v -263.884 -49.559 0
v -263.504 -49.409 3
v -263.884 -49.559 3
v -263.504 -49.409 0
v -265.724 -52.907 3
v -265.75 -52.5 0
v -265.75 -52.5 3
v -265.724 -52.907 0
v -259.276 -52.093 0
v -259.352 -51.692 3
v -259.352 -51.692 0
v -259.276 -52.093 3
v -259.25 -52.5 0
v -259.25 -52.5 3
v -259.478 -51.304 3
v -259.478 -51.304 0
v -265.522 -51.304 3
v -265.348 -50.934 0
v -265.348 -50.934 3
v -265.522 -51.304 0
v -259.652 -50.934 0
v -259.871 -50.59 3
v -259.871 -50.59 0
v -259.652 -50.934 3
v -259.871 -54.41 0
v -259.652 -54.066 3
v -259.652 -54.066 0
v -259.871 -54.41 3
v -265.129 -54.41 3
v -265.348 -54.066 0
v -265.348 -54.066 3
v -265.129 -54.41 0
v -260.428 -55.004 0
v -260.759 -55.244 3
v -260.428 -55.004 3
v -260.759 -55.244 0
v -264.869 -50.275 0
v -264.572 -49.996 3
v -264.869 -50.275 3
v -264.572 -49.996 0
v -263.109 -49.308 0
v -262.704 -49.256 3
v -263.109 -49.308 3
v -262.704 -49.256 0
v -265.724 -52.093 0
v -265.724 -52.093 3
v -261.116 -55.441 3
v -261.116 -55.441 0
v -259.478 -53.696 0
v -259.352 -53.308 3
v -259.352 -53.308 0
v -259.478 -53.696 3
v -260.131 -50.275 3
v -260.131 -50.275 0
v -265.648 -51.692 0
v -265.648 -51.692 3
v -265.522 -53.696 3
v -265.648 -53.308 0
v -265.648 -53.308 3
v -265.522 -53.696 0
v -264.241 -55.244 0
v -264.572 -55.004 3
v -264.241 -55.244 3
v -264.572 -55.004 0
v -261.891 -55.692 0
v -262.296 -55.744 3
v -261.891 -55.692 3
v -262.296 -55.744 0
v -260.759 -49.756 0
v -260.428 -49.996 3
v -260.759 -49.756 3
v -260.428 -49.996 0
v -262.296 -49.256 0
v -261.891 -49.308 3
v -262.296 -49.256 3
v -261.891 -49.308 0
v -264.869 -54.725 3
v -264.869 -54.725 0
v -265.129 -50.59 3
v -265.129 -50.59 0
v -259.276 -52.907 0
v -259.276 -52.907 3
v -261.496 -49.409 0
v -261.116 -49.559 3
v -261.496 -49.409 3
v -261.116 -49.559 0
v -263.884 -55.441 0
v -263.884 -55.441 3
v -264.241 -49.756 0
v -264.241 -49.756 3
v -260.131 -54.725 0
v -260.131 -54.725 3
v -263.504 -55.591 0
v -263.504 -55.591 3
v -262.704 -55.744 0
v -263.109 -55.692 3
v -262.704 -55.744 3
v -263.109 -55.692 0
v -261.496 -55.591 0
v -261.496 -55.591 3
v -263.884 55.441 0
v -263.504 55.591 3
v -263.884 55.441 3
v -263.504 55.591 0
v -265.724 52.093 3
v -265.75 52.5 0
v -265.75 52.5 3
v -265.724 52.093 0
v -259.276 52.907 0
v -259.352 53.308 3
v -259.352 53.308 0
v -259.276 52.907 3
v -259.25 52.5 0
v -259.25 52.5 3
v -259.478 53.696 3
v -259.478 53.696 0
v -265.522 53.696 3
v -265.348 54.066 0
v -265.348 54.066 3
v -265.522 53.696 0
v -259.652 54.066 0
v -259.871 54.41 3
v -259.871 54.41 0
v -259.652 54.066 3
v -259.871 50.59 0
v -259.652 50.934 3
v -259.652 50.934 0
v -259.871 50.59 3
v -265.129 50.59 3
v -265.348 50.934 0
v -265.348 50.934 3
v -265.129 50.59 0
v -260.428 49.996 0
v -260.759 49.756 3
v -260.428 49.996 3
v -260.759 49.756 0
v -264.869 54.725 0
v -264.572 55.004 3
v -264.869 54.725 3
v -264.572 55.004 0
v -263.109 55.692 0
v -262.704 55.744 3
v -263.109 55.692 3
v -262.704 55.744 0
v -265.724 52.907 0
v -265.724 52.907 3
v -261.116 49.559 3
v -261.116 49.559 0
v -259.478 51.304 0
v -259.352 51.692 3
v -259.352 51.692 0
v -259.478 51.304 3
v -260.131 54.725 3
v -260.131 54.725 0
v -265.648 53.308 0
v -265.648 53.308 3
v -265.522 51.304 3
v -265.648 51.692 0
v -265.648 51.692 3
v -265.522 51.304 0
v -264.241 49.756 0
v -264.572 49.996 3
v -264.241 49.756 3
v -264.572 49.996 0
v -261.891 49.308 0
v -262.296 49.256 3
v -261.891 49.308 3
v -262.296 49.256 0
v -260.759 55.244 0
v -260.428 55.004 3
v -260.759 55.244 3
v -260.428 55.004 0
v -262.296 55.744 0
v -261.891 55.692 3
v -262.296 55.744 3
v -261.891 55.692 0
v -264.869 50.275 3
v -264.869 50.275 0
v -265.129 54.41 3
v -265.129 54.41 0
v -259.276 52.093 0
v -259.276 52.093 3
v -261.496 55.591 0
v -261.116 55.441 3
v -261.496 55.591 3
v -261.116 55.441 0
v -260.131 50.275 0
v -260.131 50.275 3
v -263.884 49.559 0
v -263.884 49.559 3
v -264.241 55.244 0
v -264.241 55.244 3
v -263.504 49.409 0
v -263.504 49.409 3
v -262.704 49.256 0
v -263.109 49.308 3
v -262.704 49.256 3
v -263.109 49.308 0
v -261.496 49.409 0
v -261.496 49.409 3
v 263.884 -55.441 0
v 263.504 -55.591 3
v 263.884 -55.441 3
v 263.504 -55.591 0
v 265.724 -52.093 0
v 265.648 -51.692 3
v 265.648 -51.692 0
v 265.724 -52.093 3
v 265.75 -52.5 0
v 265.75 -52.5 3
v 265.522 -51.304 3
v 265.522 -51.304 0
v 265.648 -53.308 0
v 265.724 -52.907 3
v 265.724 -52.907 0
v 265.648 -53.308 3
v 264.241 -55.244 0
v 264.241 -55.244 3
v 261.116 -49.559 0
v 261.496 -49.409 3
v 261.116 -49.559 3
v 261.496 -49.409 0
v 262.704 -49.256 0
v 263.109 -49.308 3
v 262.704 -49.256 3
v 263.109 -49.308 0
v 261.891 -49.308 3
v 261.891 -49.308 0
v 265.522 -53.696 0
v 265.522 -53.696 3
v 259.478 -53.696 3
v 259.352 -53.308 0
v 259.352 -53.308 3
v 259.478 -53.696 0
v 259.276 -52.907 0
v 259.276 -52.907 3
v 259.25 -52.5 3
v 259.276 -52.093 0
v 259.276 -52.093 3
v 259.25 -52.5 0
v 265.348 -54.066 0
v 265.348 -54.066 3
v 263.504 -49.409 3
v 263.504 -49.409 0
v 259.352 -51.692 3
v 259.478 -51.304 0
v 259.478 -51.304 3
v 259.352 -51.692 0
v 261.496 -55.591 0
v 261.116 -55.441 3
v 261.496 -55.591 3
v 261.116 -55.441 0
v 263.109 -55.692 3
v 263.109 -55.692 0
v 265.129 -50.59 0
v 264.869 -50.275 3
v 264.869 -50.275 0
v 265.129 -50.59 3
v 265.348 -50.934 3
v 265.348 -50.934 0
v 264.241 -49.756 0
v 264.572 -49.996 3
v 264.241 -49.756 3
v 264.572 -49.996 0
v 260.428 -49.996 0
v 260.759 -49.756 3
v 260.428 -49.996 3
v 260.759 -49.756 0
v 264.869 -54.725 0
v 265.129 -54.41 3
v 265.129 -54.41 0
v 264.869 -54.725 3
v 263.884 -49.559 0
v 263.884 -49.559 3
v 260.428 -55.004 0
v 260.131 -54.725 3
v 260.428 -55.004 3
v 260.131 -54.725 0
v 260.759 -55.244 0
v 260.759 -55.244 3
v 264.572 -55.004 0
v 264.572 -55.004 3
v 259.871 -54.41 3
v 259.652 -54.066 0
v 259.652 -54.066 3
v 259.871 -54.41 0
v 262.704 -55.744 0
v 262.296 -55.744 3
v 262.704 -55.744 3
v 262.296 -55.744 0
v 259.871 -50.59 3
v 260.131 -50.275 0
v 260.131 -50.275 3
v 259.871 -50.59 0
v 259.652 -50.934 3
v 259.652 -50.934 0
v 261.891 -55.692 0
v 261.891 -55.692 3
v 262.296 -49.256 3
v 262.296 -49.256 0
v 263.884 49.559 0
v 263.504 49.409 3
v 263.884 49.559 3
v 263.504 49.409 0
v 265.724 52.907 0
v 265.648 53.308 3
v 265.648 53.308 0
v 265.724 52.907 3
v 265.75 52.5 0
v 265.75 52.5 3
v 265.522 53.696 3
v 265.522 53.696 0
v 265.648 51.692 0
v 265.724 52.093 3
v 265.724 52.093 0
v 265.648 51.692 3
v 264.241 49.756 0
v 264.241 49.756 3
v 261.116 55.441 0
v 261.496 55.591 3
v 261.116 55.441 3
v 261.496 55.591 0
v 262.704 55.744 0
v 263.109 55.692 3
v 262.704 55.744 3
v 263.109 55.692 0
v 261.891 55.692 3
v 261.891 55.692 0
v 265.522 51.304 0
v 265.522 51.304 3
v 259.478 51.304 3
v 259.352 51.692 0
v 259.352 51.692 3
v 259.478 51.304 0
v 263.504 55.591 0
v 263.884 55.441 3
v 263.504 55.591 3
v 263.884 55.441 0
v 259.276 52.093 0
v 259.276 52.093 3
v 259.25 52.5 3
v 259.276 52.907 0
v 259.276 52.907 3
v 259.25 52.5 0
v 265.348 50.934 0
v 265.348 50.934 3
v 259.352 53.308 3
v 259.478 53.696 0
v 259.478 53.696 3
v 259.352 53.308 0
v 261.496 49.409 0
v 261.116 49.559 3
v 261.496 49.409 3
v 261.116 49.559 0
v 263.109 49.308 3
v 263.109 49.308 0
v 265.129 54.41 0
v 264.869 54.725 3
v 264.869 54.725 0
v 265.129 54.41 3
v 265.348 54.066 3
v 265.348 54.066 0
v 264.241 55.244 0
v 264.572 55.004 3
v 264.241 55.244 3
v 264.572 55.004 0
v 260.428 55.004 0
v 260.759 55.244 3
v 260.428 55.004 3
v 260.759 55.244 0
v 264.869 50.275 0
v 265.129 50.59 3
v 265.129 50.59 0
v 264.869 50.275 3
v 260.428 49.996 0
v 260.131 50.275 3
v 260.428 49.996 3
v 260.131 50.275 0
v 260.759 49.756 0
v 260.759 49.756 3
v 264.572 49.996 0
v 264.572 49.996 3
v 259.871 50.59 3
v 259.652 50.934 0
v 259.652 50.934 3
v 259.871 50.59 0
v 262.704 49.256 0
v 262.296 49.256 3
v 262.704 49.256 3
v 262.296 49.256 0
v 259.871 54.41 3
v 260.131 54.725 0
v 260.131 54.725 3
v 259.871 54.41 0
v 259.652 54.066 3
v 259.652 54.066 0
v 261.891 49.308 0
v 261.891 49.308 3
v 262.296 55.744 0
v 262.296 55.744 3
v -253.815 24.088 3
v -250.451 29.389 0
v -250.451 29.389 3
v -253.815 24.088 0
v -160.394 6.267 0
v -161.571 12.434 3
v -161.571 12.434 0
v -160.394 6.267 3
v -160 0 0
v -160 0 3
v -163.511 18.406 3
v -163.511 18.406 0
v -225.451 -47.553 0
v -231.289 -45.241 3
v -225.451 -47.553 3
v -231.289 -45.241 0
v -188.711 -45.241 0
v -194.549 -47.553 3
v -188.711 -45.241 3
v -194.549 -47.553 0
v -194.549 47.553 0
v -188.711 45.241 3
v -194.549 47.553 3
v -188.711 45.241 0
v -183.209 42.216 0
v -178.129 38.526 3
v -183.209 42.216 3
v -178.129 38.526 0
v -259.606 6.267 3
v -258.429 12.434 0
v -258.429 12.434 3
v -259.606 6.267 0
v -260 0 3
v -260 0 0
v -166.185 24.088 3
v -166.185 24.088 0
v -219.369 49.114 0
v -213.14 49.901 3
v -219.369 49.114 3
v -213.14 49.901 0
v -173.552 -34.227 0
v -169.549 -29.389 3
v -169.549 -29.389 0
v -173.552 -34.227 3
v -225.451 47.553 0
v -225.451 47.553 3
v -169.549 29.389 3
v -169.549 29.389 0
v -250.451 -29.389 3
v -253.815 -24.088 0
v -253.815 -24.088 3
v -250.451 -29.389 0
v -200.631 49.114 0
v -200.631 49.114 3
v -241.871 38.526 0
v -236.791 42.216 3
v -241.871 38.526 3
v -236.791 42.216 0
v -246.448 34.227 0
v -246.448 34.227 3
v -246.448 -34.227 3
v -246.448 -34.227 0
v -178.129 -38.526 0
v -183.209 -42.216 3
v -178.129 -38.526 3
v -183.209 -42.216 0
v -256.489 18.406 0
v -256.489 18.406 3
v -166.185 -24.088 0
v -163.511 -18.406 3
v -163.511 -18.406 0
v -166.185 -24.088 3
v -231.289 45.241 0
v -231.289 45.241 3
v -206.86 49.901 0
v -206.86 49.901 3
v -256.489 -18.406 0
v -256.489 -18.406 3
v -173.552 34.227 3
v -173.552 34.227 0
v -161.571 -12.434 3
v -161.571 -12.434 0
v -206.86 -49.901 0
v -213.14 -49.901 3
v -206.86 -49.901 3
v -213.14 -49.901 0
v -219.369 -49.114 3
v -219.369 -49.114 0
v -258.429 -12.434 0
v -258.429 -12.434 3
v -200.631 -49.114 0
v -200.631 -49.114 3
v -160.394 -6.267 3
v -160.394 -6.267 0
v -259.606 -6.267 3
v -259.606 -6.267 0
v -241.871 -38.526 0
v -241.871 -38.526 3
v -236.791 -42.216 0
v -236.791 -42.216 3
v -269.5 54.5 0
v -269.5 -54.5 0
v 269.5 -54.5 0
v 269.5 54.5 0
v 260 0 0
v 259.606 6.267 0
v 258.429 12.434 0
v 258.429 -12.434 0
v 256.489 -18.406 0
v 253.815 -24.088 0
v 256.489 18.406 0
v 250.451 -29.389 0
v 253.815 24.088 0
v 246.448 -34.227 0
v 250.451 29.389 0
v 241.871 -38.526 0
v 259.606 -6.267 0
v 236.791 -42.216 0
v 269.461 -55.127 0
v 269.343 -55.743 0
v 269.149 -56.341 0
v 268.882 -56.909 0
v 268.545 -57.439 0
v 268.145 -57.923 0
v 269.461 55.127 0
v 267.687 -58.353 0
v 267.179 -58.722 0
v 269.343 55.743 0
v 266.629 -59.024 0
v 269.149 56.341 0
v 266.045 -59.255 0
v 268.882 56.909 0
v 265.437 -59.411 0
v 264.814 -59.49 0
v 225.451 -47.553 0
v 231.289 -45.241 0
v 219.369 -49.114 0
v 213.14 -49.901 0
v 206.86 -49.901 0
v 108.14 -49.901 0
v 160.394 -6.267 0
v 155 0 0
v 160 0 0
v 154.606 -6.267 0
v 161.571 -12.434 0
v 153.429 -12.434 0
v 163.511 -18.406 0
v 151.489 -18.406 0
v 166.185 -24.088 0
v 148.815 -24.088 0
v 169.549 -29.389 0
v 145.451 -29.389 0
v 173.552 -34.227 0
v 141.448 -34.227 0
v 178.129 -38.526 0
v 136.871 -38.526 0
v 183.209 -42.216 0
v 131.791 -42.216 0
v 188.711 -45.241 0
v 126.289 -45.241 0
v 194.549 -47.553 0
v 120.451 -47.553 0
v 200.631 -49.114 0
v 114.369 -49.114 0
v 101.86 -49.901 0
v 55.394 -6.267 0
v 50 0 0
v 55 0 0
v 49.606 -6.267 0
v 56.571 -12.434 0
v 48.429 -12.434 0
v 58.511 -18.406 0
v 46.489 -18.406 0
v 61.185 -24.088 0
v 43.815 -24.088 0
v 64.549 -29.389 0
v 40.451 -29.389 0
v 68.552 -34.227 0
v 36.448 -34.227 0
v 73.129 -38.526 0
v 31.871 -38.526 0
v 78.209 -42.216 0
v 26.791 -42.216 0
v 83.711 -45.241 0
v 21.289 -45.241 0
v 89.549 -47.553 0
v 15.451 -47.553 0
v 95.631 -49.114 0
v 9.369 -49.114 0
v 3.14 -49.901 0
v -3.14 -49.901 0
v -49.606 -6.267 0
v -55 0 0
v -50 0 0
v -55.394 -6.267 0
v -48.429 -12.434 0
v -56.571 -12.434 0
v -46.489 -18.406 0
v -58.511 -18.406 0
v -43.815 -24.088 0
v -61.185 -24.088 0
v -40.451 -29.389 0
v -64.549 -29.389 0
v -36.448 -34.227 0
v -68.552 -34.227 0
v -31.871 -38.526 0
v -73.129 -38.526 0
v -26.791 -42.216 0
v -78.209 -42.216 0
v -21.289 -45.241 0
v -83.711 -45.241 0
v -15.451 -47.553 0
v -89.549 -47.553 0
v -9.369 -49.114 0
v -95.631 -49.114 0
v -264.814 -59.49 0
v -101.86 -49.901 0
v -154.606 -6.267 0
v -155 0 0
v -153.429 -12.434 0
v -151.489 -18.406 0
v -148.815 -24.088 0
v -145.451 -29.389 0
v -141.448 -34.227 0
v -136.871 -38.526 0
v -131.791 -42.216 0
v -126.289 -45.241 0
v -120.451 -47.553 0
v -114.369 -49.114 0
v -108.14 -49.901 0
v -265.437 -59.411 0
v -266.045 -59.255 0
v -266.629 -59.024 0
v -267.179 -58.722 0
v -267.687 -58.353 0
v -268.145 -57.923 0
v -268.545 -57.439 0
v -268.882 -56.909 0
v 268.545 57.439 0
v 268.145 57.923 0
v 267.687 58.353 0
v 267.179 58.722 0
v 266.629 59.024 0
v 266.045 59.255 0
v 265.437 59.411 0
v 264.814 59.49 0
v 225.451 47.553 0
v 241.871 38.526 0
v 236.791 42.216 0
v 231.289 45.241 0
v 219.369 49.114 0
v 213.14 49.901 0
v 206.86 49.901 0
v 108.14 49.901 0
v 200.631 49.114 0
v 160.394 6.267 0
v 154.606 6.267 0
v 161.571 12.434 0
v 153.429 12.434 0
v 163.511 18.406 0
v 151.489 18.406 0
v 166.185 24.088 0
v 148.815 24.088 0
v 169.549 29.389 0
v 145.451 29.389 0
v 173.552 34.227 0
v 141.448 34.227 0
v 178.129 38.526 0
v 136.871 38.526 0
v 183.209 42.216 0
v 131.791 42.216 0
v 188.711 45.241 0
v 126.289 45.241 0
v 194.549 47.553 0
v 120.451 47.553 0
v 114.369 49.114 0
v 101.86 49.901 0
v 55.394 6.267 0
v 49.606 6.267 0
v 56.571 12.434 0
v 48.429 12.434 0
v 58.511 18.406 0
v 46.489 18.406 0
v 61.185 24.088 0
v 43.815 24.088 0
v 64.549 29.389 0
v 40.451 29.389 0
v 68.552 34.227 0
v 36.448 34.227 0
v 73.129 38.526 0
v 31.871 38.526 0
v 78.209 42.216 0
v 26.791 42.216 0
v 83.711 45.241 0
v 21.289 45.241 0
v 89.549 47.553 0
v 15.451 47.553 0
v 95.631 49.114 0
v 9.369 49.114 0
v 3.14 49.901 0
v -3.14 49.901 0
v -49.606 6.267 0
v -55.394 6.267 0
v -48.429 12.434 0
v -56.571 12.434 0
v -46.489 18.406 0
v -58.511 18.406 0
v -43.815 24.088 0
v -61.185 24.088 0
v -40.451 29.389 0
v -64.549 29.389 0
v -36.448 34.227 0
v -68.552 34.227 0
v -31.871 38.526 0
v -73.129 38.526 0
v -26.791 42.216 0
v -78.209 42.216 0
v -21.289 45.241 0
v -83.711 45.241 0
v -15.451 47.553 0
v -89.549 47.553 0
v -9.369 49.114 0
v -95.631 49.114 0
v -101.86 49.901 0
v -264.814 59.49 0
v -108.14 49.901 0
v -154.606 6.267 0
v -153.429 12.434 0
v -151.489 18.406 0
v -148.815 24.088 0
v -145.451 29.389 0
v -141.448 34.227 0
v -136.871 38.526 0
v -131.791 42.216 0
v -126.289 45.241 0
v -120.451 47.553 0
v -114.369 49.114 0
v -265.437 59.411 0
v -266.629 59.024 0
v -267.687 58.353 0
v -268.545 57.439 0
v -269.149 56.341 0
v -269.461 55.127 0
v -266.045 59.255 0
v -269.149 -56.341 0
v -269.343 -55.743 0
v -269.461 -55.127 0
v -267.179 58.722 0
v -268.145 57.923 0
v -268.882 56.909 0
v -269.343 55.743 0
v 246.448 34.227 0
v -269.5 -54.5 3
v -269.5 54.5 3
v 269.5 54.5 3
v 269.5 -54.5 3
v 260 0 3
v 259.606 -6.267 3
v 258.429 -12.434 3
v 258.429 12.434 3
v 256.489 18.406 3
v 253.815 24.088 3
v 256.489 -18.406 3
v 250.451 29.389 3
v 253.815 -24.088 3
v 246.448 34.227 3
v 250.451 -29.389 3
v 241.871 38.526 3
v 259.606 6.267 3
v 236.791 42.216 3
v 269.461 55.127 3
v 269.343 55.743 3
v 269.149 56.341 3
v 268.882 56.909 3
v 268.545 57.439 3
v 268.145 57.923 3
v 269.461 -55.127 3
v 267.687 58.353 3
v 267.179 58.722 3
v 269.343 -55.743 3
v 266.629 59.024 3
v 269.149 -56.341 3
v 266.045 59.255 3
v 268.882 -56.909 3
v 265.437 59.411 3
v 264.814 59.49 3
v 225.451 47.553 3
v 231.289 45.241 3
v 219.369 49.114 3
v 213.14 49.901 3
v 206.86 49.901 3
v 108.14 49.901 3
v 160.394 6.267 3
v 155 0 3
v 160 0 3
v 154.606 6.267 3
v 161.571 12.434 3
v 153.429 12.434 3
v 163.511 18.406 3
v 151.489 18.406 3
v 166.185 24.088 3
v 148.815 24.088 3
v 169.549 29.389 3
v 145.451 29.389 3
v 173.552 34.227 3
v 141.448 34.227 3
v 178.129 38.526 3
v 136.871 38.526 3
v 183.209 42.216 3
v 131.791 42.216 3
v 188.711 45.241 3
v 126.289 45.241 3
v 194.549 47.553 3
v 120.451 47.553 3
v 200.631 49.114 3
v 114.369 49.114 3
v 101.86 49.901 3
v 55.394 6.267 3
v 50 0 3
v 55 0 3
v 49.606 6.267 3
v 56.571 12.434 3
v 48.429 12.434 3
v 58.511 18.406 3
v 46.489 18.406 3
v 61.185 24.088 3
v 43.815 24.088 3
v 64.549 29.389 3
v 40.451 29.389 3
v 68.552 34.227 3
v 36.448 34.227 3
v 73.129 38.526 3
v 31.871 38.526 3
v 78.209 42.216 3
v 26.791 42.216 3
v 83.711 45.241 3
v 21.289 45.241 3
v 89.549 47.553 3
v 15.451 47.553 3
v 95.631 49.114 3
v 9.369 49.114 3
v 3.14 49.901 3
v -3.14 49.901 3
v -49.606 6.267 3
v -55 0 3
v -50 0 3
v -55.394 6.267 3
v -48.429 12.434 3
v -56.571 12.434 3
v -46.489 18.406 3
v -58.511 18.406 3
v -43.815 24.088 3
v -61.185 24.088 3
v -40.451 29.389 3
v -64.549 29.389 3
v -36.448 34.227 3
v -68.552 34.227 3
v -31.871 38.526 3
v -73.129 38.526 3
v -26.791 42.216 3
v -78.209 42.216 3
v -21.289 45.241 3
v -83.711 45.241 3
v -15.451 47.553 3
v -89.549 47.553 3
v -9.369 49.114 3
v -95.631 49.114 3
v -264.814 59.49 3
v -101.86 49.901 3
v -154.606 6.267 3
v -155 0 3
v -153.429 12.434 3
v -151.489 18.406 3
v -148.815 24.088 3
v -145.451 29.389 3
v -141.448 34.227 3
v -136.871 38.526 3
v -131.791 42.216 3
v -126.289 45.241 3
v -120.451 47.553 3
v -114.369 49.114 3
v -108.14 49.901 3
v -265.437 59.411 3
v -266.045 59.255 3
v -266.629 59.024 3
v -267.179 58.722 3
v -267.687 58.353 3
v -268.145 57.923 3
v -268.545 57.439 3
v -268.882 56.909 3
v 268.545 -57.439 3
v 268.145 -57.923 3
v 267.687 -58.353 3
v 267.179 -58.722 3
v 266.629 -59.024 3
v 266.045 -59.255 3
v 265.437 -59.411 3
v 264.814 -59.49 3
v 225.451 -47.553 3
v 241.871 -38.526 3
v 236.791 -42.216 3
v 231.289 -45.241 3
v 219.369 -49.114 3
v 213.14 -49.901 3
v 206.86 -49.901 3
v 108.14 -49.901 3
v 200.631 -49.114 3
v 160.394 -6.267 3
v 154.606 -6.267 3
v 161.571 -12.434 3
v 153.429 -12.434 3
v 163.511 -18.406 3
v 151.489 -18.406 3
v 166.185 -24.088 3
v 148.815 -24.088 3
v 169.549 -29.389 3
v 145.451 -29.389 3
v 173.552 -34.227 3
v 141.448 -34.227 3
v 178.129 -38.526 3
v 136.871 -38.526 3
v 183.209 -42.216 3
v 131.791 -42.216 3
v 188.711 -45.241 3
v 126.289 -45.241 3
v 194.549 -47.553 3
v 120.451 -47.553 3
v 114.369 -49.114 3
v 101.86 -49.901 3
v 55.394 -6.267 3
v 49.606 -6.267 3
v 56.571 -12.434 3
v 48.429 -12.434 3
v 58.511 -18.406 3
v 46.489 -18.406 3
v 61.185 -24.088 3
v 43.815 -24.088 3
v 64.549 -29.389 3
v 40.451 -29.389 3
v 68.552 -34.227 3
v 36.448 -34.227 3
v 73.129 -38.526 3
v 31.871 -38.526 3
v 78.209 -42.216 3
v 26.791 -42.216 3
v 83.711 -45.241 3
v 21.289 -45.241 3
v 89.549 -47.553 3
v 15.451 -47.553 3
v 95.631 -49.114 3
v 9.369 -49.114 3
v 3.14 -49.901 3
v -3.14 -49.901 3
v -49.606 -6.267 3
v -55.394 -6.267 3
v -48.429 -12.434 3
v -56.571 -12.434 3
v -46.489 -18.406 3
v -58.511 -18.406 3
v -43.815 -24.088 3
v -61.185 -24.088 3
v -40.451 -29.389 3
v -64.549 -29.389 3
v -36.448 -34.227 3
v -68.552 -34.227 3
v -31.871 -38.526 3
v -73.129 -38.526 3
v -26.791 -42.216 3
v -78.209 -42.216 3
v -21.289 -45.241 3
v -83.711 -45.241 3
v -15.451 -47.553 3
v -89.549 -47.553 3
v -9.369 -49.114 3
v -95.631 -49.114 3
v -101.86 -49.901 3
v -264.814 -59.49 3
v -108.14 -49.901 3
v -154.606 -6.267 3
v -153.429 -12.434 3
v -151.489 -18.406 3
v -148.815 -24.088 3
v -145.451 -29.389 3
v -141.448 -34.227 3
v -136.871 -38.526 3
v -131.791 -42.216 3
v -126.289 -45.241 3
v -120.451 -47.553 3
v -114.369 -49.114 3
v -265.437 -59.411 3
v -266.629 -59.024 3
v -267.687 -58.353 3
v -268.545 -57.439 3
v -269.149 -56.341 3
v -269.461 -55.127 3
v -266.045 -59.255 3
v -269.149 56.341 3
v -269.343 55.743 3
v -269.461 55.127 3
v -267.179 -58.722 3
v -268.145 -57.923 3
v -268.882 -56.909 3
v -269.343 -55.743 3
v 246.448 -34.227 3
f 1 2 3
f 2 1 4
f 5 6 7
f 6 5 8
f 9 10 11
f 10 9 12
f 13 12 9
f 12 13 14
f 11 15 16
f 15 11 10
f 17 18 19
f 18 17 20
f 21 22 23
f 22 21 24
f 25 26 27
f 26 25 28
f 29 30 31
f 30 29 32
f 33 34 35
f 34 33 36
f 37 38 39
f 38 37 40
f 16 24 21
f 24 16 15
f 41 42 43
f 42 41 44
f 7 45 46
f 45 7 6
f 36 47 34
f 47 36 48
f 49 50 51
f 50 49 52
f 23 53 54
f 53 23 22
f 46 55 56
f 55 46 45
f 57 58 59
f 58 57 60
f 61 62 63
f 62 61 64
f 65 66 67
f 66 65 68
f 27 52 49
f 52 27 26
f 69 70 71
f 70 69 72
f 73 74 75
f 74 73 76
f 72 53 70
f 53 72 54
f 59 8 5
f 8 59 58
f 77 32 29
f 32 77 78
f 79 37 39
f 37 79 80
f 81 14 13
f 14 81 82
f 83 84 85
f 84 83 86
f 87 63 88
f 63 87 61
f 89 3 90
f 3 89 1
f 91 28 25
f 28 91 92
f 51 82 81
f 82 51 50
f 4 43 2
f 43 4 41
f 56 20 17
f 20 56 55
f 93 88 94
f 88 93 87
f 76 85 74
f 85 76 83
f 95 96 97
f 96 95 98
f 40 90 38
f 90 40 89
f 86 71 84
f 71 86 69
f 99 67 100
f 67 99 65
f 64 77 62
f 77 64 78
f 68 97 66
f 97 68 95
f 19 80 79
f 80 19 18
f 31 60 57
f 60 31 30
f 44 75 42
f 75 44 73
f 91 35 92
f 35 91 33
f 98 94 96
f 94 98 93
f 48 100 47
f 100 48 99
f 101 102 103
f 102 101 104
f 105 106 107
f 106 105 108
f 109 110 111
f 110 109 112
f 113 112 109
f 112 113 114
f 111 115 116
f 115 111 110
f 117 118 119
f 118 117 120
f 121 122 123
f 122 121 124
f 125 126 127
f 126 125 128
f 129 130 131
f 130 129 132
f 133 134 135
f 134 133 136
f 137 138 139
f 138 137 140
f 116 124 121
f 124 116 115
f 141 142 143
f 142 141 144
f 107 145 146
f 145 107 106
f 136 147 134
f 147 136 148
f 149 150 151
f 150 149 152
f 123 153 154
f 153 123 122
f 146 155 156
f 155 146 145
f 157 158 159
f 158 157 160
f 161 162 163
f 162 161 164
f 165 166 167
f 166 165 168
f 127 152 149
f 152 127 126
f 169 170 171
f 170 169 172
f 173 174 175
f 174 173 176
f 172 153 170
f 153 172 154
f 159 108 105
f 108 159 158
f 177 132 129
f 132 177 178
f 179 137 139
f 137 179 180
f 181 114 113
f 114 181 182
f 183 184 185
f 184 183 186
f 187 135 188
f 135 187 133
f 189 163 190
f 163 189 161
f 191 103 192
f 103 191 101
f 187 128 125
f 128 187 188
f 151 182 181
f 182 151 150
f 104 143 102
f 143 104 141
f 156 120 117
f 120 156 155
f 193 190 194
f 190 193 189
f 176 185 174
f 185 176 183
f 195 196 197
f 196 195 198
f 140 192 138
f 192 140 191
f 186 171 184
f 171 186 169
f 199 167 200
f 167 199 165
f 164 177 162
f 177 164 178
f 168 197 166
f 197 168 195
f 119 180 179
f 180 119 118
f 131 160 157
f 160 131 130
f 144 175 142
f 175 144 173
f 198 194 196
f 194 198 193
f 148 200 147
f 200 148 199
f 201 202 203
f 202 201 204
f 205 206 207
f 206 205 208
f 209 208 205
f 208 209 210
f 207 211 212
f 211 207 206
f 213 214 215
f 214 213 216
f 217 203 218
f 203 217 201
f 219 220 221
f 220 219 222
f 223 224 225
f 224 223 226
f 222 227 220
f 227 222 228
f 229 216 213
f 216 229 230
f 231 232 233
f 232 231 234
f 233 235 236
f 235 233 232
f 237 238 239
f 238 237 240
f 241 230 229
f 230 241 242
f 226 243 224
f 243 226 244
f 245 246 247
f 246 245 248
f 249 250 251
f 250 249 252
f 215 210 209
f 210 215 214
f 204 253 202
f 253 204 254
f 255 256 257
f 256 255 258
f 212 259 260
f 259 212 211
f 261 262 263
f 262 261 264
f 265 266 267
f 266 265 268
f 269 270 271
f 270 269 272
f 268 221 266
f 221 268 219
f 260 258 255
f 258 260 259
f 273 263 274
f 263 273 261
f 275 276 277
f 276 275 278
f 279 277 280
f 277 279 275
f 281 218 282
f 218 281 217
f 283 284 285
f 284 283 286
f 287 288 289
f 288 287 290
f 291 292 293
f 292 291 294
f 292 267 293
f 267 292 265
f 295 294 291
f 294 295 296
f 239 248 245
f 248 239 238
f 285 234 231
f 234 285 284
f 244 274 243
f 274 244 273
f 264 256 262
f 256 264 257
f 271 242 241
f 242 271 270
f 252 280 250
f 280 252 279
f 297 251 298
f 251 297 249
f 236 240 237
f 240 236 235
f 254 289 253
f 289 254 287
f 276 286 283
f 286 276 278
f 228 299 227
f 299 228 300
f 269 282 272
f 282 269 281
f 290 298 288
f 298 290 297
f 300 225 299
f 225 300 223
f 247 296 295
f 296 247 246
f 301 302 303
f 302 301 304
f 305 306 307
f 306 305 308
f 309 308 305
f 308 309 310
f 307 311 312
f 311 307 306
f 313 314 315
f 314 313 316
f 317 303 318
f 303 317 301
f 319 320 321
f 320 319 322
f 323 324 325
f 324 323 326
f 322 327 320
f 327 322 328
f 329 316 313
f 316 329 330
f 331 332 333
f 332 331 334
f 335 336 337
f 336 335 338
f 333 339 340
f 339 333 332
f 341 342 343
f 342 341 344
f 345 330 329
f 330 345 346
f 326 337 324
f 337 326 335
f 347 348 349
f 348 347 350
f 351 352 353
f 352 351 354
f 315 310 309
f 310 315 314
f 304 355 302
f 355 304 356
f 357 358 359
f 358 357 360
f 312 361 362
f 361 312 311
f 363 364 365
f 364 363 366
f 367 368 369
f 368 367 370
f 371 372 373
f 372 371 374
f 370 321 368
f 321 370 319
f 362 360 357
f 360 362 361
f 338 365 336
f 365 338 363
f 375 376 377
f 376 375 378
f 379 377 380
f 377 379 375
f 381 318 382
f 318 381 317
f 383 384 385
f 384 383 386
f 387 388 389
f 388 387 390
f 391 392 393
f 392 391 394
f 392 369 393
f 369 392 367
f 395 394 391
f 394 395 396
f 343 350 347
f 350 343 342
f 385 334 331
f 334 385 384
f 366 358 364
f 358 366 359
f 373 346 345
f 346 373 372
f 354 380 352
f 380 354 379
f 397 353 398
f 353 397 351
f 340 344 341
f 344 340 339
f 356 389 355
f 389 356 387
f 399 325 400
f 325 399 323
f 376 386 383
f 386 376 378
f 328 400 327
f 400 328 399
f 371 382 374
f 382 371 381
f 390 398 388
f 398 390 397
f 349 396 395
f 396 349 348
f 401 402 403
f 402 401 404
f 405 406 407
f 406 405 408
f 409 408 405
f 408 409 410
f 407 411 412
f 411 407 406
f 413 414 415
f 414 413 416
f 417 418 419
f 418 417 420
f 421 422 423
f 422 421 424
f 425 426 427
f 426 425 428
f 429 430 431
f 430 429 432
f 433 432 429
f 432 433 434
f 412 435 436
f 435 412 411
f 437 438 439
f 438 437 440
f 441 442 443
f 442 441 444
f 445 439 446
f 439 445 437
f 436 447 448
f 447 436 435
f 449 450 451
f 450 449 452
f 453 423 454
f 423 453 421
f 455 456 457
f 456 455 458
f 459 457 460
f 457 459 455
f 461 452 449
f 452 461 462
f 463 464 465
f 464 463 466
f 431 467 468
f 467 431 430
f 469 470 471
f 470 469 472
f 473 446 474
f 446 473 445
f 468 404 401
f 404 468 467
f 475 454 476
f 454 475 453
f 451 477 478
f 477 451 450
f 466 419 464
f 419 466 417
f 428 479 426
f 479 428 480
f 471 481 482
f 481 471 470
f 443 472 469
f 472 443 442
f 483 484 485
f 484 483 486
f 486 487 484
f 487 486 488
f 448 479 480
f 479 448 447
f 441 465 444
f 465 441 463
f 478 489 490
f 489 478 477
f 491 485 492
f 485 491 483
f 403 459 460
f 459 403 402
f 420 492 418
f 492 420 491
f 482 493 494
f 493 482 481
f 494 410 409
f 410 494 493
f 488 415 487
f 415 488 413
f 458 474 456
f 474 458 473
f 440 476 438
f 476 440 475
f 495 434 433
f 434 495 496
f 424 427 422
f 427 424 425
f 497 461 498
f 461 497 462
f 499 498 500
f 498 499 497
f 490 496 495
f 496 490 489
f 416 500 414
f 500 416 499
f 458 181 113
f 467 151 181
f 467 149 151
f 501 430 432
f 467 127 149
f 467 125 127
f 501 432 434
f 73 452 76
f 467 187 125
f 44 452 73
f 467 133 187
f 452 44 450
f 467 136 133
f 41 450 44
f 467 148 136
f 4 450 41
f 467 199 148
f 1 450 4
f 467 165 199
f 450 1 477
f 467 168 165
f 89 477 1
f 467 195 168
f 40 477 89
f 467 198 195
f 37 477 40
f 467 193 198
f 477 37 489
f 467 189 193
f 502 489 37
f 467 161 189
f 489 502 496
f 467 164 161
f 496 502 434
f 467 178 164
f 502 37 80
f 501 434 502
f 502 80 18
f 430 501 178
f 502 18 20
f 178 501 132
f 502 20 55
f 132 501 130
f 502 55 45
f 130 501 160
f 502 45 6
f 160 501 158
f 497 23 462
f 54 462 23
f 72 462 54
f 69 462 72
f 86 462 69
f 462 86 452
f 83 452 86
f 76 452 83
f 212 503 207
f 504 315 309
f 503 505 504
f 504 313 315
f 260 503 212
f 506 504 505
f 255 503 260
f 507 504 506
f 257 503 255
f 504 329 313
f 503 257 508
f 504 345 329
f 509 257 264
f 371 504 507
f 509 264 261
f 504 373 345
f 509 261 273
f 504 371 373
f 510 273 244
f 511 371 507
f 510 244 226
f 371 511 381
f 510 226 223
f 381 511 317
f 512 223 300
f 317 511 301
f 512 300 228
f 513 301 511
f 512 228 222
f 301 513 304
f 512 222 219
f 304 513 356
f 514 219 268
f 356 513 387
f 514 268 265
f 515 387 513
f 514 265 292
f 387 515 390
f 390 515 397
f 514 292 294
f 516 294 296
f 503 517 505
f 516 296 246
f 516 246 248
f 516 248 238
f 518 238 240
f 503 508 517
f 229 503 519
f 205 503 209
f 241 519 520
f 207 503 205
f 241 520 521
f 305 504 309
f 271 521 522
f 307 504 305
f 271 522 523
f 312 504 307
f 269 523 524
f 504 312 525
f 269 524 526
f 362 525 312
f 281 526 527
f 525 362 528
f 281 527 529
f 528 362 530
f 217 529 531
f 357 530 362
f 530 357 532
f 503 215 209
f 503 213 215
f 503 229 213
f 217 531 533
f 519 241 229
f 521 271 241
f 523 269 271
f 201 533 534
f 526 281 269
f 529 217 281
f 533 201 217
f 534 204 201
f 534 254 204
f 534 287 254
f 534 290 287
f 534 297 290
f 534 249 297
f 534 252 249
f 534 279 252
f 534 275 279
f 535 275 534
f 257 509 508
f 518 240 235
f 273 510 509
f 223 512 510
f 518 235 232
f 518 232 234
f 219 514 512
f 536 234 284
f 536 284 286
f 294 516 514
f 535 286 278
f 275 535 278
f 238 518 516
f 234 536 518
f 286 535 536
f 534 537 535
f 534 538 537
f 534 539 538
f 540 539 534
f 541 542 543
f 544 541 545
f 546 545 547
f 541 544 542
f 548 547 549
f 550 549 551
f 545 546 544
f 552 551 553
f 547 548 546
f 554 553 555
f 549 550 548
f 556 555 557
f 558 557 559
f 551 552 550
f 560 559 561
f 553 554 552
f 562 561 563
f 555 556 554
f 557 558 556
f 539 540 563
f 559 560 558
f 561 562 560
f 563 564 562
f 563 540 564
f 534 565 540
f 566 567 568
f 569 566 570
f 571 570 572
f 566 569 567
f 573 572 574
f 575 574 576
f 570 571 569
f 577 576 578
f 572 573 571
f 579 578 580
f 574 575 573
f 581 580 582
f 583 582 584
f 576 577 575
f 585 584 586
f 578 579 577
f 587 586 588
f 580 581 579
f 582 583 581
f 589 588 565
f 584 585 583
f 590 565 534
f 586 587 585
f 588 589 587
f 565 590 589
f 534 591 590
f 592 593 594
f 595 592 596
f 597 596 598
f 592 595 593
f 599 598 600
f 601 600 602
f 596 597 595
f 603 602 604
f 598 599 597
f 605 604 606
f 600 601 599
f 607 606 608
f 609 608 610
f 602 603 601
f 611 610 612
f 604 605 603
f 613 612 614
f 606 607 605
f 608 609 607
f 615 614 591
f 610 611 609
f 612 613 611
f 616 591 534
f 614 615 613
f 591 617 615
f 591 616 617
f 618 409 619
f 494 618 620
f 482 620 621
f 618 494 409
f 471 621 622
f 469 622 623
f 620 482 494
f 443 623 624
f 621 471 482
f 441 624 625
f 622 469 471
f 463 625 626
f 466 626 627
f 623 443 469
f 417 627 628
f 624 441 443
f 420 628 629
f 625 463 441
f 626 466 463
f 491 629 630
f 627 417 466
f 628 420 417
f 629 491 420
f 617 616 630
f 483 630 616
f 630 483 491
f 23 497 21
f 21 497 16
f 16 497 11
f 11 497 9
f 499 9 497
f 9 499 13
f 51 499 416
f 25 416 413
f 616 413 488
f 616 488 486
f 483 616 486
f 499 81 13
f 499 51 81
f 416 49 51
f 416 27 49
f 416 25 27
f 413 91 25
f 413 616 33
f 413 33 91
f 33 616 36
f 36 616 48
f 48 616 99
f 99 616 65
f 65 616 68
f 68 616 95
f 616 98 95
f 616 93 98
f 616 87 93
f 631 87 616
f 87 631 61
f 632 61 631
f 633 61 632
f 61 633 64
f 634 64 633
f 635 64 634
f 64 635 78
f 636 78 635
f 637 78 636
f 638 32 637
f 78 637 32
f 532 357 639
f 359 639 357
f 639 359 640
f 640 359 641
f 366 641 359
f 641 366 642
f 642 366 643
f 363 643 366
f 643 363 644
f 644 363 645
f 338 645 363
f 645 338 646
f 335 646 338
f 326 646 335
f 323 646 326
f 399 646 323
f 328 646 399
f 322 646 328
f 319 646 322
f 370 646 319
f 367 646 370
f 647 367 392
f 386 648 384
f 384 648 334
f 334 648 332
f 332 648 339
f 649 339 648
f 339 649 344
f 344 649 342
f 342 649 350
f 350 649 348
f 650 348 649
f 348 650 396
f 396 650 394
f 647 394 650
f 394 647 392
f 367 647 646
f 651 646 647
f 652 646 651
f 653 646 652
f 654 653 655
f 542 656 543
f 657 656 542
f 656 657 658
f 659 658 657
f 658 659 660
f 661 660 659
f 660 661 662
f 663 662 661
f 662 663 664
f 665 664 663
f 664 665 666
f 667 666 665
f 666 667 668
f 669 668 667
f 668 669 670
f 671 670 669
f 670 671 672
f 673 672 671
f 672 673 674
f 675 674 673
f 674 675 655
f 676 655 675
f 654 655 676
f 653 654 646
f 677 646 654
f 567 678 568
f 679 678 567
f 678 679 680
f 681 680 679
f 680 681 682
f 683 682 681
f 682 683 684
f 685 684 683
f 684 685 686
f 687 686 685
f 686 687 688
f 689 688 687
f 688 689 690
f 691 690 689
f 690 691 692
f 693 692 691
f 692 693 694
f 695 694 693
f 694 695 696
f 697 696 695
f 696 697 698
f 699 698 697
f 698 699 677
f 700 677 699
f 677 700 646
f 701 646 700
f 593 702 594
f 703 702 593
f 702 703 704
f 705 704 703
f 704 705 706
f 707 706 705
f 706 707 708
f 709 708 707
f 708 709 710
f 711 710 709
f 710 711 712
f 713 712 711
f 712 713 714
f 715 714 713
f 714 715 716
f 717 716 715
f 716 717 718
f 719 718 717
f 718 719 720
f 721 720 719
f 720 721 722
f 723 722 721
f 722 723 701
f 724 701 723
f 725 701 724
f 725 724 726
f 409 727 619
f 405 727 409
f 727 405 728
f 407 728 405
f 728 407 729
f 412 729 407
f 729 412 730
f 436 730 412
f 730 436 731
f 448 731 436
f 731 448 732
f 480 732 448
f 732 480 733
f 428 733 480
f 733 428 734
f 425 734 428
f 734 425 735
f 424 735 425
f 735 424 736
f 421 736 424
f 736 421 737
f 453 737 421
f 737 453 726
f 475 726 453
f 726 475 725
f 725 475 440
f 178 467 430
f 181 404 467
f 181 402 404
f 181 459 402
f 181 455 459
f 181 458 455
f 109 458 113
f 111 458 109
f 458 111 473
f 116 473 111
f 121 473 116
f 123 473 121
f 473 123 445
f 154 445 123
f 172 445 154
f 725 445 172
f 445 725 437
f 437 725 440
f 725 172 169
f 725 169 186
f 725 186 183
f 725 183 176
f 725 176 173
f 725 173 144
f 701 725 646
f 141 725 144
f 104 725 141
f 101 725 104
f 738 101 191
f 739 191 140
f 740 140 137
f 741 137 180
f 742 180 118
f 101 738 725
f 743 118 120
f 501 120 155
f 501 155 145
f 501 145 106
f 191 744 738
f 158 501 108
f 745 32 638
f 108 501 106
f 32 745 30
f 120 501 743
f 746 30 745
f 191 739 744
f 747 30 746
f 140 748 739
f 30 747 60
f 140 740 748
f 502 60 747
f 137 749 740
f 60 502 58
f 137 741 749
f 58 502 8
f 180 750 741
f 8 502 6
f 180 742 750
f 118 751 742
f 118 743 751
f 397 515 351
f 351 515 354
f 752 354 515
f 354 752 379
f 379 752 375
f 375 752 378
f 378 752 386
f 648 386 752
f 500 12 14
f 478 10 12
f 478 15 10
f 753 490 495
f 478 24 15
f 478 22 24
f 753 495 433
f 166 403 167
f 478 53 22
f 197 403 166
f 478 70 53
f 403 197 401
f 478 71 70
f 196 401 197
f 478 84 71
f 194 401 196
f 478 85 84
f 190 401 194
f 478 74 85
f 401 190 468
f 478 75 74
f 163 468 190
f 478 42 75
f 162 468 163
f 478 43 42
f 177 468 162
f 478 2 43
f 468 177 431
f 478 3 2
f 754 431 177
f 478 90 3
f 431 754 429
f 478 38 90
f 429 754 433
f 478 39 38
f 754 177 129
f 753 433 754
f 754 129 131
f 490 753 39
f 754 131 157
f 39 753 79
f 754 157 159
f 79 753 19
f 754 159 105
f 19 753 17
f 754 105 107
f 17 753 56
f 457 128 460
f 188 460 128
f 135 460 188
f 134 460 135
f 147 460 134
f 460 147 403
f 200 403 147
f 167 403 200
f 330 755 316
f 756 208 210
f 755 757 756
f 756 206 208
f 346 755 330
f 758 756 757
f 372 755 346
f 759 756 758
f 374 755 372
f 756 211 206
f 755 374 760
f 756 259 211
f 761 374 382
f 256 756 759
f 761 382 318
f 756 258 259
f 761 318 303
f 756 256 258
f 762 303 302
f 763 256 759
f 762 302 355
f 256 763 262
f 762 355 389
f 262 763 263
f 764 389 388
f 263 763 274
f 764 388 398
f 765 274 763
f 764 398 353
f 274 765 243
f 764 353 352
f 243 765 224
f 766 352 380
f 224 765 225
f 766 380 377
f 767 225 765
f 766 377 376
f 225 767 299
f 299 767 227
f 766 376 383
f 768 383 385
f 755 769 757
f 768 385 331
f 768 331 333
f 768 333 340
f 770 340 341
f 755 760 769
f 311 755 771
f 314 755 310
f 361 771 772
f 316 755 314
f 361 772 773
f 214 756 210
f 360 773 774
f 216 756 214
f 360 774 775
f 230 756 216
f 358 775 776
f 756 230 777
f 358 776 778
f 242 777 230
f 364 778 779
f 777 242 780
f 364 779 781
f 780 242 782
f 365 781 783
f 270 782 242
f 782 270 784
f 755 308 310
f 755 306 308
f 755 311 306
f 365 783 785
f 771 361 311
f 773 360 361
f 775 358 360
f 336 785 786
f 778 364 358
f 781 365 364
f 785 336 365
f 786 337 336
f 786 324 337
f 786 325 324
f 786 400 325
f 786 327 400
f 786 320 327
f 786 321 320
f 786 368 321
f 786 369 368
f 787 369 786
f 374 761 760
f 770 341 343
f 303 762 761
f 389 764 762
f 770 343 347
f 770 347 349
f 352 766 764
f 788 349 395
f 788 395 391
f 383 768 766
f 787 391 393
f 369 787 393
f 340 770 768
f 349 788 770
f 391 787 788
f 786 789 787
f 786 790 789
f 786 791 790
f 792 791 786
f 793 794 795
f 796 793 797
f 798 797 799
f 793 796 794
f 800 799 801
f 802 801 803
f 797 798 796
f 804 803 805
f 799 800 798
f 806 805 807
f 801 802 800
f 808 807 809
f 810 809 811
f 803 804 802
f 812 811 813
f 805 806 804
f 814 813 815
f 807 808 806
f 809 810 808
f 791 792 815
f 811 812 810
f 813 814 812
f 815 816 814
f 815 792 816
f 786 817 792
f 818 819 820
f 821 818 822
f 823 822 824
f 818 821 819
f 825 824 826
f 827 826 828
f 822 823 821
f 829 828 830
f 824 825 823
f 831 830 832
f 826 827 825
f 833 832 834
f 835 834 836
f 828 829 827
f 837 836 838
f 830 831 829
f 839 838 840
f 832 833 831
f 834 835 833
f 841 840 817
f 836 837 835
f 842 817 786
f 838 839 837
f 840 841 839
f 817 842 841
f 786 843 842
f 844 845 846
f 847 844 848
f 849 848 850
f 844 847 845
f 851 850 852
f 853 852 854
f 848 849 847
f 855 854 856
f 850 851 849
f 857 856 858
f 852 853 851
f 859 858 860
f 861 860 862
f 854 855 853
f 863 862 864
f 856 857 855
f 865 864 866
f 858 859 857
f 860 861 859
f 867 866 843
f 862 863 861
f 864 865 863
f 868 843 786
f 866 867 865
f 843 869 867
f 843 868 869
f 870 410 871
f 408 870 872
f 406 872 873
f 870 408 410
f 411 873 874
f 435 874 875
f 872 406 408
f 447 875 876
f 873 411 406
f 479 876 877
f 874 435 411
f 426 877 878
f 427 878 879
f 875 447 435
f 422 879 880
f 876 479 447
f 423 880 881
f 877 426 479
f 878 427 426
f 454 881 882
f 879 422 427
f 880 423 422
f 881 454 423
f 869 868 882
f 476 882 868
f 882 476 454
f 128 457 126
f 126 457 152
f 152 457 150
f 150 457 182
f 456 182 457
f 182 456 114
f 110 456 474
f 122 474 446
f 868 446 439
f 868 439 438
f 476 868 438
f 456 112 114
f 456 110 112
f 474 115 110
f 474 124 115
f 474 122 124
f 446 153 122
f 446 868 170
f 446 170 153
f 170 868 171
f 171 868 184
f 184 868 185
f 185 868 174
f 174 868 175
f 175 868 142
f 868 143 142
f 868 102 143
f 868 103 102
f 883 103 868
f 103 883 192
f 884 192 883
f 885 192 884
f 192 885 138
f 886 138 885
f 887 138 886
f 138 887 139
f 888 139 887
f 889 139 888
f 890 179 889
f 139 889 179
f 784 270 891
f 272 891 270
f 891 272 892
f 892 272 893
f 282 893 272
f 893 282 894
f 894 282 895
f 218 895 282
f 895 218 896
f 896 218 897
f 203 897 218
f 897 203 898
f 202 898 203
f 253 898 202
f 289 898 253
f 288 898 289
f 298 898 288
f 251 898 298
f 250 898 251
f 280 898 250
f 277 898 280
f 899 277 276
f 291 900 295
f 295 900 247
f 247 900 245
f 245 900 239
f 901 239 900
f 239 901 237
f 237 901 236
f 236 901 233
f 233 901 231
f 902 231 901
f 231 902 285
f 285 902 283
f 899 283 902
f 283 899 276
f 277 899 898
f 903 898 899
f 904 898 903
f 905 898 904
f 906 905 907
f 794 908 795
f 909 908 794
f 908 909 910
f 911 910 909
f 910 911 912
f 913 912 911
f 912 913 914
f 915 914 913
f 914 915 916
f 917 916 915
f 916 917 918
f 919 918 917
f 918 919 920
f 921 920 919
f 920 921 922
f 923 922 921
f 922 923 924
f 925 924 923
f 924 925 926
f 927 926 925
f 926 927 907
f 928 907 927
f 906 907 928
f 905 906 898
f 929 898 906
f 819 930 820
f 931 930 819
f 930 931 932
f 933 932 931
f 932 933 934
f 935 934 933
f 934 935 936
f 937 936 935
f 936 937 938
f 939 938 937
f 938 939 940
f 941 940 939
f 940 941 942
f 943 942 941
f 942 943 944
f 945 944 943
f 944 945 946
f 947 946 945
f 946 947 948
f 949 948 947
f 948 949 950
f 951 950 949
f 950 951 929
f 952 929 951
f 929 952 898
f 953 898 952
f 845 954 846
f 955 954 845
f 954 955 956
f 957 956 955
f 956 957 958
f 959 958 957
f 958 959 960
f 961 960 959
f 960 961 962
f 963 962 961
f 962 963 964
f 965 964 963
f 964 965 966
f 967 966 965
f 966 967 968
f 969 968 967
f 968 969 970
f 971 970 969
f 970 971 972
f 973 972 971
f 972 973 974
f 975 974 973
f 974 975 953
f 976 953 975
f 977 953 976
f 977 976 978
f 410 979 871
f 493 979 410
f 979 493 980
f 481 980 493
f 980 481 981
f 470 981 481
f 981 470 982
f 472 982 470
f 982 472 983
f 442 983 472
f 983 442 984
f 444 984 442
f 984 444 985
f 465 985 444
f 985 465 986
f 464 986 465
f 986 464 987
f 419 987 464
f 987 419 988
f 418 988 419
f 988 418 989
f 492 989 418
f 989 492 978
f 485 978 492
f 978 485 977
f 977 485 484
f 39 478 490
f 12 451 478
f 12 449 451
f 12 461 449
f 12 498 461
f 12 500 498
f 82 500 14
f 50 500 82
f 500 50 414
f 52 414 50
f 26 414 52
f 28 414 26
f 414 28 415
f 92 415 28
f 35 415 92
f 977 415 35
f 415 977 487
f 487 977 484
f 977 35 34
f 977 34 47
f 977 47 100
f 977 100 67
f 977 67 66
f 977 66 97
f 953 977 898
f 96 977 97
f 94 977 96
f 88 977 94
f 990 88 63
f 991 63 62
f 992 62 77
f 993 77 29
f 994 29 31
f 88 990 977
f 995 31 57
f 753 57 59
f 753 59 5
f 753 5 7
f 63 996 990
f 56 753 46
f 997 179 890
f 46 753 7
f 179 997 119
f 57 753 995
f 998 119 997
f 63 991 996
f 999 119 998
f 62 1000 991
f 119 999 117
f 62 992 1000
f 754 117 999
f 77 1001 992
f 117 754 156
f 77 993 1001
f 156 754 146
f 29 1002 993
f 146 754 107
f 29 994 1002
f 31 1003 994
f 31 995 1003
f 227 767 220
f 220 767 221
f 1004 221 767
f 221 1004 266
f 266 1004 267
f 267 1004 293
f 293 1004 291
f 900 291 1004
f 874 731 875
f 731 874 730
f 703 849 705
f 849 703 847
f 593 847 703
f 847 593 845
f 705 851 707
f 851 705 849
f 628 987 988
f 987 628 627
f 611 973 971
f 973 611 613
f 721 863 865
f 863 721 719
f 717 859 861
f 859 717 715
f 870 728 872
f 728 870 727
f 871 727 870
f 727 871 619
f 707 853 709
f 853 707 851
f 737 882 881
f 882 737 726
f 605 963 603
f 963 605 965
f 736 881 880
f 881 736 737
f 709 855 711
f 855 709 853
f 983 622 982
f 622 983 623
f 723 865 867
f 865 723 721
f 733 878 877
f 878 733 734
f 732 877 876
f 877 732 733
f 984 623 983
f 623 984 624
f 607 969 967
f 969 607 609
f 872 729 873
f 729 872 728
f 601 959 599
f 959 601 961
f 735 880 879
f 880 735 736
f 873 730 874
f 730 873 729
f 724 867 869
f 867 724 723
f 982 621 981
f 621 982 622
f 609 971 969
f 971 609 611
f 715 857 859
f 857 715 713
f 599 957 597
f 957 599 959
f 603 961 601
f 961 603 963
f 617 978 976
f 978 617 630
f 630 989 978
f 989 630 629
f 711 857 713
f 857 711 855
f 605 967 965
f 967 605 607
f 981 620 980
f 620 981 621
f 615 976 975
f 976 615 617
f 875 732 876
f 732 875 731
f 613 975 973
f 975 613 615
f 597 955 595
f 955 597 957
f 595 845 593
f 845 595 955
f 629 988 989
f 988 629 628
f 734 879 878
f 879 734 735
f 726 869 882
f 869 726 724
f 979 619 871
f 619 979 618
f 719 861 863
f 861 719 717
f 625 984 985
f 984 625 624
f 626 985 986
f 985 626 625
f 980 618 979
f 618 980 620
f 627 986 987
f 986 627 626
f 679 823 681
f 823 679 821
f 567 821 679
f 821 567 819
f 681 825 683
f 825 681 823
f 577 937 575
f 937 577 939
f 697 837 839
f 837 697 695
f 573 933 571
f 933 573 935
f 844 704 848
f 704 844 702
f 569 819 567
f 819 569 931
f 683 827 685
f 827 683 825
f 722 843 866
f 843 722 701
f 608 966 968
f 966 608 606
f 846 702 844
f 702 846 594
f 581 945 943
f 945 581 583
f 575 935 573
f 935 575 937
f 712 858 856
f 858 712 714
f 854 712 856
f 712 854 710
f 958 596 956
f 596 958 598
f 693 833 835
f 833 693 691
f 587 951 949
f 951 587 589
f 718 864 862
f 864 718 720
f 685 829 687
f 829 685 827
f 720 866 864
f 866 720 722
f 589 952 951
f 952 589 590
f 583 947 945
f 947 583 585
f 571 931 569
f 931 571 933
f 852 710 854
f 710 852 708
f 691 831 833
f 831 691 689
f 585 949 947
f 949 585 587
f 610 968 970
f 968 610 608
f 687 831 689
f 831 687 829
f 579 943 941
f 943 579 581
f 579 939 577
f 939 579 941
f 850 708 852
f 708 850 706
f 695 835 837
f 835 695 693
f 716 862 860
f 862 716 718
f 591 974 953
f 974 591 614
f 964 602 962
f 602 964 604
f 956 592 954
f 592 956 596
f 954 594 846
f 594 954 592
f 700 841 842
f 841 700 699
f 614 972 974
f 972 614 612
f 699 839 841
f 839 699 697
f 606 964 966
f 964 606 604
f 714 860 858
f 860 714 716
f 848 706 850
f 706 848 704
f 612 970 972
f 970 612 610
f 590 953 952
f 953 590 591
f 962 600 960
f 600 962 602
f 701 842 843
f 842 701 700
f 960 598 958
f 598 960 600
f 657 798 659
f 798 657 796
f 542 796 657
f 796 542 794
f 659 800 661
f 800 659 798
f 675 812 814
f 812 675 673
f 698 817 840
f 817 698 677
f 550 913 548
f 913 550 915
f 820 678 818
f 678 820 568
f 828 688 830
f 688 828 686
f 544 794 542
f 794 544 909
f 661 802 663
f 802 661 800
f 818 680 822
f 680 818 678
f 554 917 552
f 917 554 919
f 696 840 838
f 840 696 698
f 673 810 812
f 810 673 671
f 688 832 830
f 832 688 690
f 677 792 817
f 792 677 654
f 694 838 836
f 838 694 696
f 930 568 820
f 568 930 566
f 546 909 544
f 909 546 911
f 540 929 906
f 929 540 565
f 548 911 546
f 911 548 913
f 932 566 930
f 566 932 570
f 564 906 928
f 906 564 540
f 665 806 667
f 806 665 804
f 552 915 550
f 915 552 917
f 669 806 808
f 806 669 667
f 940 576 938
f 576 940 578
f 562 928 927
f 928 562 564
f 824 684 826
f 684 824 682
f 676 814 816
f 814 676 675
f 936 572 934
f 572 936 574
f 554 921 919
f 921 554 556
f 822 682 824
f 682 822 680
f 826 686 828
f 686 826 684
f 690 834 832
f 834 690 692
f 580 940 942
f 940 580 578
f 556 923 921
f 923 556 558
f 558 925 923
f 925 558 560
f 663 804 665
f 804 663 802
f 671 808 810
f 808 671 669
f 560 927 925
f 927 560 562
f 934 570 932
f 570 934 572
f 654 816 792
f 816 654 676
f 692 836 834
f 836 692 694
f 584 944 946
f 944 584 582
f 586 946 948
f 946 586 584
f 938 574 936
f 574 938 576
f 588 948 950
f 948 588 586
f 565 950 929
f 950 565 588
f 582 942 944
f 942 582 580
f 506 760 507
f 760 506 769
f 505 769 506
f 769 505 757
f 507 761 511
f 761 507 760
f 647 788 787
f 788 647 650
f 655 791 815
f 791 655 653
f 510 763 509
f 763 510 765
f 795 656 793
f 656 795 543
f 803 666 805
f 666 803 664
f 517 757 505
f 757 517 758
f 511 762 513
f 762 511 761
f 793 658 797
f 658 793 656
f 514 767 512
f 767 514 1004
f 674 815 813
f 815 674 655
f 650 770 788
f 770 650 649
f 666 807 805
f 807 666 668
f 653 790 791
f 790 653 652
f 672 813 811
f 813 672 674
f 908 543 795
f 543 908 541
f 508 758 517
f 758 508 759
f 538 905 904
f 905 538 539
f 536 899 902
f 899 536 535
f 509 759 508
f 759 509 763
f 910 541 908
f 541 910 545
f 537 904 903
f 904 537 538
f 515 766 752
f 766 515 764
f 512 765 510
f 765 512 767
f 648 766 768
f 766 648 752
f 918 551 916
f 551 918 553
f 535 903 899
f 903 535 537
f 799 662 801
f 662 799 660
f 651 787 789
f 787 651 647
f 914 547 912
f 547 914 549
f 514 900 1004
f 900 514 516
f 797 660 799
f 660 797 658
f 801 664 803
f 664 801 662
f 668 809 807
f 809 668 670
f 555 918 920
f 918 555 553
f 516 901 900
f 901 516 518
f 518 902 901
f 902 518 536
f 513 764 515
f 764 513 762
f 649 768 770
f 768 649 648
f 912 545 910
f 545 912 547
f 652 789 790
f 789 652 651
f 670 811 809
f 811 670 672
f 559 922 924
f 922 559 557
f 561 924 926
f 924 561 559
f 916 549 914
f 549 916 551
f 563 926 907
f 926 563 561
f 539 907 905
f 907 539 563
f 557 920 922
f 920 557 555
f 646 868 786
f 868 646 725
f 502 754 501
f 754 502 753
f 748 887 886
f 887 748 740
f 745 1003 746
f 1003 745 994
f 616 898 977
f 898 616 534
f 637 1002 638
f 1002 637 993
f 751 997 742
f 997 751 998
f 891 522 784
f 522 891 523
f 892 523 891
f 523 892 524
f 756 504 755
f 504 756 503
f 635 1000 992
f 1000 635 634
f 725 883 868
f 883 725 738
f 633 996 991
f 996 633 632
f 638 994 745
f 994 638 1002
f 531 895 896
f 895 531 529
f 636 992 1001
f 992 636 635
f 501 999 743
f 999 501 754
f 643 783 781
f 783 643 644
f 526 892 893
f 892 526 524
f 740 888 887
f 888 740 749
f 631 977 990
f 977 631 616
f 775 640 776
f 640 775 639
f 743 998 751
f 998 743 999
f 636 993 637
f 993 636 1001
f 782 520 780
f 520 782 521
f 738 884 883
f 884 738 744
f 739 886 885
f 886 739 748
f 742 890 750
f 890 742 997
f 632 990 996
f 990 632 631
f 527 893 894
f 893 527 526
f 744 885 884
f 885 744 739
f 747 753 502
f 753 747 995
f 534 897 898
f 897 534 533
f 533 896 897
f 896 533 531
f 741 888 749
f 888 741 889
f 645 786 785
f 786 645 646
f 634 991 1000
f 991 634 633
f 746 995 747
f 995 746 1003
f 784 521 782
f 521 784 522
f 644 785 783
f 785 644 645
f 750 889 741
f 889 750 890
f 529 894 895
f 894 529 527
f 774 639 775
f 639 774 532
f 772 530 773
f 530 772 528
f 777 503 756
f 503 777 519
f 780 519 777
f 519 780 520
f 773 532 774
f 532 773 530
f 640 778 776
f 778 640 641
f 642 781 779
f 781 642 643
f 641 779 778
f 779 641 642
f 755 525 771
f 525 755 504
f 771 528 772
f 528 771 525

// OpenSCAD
$fn = 50;

difference() {
	union() {
		hull() {
			translate(v = [-264.5, 54.5, 0]) {
				cylinder(h = 3, r = 5);
			}
			translate(v = [264.5, 54.5, 0]) {
				cylinder(h = 3, r = 5);
			}
			translate(v = [-264.5, -54.5, 0]) {
				cylinder(h = 3, r = 5);
			}
			translate(v = [264.5, -54.5, 0]) {
				cylinder(h = 3, r = 5);
			}
		}
	}
	union() {
		translate(v = [-262.5, -52.5, -100.0]) {
			cylinder(h = 200, r = 3.25);
		}
		translate(v = [-262.5, 52.5, -100.0]) {
			cylinder(h = 200, r = 3.25);
		}
		translate(v = [262.5, -52.5, -100.0]) {
			cylinder(h = 200, r = 3.25);
		}
		translate(v = [262.5, 52.5, -100.0]) {
			cylinder(h = 200, r = 3.25);
		}
		translate(v = [-262.5, -52.5, -100.0]) {
			cylinder(h = 200, r = 1.8);
		}
		translate(v = [-262.5, 52.5, -100.0]) {
			cylinder(h = 200, r = 1.8);
		}
		translate(v = [262.5, -52.5, -100.0]) {
			cylinder(h = 200, r = 1.8);
		}
		translate(v = [262.5, 52.5, -100.0]) {
			cylinder(h = 200, r = 1.8);
		}
		translate(v = [-210.0, 0, 0.0]) {
			cylinder(h = 3, r = 50.0);
		}
		translate(v = [-105.0, 0, 0.0]) {
			cylinder(h = 3, r = 50.0);
		}
		cylinder(h = 3, r = 50.0);
		translate(v = [105.0, 0, 0.0]) {
			cylinder(h = 3, r = 50.0);
		}
		translate(v = [210.0, 0, 0.0]) {
			cylinder(h = 3, r = 50.0);
		}
	}
}
